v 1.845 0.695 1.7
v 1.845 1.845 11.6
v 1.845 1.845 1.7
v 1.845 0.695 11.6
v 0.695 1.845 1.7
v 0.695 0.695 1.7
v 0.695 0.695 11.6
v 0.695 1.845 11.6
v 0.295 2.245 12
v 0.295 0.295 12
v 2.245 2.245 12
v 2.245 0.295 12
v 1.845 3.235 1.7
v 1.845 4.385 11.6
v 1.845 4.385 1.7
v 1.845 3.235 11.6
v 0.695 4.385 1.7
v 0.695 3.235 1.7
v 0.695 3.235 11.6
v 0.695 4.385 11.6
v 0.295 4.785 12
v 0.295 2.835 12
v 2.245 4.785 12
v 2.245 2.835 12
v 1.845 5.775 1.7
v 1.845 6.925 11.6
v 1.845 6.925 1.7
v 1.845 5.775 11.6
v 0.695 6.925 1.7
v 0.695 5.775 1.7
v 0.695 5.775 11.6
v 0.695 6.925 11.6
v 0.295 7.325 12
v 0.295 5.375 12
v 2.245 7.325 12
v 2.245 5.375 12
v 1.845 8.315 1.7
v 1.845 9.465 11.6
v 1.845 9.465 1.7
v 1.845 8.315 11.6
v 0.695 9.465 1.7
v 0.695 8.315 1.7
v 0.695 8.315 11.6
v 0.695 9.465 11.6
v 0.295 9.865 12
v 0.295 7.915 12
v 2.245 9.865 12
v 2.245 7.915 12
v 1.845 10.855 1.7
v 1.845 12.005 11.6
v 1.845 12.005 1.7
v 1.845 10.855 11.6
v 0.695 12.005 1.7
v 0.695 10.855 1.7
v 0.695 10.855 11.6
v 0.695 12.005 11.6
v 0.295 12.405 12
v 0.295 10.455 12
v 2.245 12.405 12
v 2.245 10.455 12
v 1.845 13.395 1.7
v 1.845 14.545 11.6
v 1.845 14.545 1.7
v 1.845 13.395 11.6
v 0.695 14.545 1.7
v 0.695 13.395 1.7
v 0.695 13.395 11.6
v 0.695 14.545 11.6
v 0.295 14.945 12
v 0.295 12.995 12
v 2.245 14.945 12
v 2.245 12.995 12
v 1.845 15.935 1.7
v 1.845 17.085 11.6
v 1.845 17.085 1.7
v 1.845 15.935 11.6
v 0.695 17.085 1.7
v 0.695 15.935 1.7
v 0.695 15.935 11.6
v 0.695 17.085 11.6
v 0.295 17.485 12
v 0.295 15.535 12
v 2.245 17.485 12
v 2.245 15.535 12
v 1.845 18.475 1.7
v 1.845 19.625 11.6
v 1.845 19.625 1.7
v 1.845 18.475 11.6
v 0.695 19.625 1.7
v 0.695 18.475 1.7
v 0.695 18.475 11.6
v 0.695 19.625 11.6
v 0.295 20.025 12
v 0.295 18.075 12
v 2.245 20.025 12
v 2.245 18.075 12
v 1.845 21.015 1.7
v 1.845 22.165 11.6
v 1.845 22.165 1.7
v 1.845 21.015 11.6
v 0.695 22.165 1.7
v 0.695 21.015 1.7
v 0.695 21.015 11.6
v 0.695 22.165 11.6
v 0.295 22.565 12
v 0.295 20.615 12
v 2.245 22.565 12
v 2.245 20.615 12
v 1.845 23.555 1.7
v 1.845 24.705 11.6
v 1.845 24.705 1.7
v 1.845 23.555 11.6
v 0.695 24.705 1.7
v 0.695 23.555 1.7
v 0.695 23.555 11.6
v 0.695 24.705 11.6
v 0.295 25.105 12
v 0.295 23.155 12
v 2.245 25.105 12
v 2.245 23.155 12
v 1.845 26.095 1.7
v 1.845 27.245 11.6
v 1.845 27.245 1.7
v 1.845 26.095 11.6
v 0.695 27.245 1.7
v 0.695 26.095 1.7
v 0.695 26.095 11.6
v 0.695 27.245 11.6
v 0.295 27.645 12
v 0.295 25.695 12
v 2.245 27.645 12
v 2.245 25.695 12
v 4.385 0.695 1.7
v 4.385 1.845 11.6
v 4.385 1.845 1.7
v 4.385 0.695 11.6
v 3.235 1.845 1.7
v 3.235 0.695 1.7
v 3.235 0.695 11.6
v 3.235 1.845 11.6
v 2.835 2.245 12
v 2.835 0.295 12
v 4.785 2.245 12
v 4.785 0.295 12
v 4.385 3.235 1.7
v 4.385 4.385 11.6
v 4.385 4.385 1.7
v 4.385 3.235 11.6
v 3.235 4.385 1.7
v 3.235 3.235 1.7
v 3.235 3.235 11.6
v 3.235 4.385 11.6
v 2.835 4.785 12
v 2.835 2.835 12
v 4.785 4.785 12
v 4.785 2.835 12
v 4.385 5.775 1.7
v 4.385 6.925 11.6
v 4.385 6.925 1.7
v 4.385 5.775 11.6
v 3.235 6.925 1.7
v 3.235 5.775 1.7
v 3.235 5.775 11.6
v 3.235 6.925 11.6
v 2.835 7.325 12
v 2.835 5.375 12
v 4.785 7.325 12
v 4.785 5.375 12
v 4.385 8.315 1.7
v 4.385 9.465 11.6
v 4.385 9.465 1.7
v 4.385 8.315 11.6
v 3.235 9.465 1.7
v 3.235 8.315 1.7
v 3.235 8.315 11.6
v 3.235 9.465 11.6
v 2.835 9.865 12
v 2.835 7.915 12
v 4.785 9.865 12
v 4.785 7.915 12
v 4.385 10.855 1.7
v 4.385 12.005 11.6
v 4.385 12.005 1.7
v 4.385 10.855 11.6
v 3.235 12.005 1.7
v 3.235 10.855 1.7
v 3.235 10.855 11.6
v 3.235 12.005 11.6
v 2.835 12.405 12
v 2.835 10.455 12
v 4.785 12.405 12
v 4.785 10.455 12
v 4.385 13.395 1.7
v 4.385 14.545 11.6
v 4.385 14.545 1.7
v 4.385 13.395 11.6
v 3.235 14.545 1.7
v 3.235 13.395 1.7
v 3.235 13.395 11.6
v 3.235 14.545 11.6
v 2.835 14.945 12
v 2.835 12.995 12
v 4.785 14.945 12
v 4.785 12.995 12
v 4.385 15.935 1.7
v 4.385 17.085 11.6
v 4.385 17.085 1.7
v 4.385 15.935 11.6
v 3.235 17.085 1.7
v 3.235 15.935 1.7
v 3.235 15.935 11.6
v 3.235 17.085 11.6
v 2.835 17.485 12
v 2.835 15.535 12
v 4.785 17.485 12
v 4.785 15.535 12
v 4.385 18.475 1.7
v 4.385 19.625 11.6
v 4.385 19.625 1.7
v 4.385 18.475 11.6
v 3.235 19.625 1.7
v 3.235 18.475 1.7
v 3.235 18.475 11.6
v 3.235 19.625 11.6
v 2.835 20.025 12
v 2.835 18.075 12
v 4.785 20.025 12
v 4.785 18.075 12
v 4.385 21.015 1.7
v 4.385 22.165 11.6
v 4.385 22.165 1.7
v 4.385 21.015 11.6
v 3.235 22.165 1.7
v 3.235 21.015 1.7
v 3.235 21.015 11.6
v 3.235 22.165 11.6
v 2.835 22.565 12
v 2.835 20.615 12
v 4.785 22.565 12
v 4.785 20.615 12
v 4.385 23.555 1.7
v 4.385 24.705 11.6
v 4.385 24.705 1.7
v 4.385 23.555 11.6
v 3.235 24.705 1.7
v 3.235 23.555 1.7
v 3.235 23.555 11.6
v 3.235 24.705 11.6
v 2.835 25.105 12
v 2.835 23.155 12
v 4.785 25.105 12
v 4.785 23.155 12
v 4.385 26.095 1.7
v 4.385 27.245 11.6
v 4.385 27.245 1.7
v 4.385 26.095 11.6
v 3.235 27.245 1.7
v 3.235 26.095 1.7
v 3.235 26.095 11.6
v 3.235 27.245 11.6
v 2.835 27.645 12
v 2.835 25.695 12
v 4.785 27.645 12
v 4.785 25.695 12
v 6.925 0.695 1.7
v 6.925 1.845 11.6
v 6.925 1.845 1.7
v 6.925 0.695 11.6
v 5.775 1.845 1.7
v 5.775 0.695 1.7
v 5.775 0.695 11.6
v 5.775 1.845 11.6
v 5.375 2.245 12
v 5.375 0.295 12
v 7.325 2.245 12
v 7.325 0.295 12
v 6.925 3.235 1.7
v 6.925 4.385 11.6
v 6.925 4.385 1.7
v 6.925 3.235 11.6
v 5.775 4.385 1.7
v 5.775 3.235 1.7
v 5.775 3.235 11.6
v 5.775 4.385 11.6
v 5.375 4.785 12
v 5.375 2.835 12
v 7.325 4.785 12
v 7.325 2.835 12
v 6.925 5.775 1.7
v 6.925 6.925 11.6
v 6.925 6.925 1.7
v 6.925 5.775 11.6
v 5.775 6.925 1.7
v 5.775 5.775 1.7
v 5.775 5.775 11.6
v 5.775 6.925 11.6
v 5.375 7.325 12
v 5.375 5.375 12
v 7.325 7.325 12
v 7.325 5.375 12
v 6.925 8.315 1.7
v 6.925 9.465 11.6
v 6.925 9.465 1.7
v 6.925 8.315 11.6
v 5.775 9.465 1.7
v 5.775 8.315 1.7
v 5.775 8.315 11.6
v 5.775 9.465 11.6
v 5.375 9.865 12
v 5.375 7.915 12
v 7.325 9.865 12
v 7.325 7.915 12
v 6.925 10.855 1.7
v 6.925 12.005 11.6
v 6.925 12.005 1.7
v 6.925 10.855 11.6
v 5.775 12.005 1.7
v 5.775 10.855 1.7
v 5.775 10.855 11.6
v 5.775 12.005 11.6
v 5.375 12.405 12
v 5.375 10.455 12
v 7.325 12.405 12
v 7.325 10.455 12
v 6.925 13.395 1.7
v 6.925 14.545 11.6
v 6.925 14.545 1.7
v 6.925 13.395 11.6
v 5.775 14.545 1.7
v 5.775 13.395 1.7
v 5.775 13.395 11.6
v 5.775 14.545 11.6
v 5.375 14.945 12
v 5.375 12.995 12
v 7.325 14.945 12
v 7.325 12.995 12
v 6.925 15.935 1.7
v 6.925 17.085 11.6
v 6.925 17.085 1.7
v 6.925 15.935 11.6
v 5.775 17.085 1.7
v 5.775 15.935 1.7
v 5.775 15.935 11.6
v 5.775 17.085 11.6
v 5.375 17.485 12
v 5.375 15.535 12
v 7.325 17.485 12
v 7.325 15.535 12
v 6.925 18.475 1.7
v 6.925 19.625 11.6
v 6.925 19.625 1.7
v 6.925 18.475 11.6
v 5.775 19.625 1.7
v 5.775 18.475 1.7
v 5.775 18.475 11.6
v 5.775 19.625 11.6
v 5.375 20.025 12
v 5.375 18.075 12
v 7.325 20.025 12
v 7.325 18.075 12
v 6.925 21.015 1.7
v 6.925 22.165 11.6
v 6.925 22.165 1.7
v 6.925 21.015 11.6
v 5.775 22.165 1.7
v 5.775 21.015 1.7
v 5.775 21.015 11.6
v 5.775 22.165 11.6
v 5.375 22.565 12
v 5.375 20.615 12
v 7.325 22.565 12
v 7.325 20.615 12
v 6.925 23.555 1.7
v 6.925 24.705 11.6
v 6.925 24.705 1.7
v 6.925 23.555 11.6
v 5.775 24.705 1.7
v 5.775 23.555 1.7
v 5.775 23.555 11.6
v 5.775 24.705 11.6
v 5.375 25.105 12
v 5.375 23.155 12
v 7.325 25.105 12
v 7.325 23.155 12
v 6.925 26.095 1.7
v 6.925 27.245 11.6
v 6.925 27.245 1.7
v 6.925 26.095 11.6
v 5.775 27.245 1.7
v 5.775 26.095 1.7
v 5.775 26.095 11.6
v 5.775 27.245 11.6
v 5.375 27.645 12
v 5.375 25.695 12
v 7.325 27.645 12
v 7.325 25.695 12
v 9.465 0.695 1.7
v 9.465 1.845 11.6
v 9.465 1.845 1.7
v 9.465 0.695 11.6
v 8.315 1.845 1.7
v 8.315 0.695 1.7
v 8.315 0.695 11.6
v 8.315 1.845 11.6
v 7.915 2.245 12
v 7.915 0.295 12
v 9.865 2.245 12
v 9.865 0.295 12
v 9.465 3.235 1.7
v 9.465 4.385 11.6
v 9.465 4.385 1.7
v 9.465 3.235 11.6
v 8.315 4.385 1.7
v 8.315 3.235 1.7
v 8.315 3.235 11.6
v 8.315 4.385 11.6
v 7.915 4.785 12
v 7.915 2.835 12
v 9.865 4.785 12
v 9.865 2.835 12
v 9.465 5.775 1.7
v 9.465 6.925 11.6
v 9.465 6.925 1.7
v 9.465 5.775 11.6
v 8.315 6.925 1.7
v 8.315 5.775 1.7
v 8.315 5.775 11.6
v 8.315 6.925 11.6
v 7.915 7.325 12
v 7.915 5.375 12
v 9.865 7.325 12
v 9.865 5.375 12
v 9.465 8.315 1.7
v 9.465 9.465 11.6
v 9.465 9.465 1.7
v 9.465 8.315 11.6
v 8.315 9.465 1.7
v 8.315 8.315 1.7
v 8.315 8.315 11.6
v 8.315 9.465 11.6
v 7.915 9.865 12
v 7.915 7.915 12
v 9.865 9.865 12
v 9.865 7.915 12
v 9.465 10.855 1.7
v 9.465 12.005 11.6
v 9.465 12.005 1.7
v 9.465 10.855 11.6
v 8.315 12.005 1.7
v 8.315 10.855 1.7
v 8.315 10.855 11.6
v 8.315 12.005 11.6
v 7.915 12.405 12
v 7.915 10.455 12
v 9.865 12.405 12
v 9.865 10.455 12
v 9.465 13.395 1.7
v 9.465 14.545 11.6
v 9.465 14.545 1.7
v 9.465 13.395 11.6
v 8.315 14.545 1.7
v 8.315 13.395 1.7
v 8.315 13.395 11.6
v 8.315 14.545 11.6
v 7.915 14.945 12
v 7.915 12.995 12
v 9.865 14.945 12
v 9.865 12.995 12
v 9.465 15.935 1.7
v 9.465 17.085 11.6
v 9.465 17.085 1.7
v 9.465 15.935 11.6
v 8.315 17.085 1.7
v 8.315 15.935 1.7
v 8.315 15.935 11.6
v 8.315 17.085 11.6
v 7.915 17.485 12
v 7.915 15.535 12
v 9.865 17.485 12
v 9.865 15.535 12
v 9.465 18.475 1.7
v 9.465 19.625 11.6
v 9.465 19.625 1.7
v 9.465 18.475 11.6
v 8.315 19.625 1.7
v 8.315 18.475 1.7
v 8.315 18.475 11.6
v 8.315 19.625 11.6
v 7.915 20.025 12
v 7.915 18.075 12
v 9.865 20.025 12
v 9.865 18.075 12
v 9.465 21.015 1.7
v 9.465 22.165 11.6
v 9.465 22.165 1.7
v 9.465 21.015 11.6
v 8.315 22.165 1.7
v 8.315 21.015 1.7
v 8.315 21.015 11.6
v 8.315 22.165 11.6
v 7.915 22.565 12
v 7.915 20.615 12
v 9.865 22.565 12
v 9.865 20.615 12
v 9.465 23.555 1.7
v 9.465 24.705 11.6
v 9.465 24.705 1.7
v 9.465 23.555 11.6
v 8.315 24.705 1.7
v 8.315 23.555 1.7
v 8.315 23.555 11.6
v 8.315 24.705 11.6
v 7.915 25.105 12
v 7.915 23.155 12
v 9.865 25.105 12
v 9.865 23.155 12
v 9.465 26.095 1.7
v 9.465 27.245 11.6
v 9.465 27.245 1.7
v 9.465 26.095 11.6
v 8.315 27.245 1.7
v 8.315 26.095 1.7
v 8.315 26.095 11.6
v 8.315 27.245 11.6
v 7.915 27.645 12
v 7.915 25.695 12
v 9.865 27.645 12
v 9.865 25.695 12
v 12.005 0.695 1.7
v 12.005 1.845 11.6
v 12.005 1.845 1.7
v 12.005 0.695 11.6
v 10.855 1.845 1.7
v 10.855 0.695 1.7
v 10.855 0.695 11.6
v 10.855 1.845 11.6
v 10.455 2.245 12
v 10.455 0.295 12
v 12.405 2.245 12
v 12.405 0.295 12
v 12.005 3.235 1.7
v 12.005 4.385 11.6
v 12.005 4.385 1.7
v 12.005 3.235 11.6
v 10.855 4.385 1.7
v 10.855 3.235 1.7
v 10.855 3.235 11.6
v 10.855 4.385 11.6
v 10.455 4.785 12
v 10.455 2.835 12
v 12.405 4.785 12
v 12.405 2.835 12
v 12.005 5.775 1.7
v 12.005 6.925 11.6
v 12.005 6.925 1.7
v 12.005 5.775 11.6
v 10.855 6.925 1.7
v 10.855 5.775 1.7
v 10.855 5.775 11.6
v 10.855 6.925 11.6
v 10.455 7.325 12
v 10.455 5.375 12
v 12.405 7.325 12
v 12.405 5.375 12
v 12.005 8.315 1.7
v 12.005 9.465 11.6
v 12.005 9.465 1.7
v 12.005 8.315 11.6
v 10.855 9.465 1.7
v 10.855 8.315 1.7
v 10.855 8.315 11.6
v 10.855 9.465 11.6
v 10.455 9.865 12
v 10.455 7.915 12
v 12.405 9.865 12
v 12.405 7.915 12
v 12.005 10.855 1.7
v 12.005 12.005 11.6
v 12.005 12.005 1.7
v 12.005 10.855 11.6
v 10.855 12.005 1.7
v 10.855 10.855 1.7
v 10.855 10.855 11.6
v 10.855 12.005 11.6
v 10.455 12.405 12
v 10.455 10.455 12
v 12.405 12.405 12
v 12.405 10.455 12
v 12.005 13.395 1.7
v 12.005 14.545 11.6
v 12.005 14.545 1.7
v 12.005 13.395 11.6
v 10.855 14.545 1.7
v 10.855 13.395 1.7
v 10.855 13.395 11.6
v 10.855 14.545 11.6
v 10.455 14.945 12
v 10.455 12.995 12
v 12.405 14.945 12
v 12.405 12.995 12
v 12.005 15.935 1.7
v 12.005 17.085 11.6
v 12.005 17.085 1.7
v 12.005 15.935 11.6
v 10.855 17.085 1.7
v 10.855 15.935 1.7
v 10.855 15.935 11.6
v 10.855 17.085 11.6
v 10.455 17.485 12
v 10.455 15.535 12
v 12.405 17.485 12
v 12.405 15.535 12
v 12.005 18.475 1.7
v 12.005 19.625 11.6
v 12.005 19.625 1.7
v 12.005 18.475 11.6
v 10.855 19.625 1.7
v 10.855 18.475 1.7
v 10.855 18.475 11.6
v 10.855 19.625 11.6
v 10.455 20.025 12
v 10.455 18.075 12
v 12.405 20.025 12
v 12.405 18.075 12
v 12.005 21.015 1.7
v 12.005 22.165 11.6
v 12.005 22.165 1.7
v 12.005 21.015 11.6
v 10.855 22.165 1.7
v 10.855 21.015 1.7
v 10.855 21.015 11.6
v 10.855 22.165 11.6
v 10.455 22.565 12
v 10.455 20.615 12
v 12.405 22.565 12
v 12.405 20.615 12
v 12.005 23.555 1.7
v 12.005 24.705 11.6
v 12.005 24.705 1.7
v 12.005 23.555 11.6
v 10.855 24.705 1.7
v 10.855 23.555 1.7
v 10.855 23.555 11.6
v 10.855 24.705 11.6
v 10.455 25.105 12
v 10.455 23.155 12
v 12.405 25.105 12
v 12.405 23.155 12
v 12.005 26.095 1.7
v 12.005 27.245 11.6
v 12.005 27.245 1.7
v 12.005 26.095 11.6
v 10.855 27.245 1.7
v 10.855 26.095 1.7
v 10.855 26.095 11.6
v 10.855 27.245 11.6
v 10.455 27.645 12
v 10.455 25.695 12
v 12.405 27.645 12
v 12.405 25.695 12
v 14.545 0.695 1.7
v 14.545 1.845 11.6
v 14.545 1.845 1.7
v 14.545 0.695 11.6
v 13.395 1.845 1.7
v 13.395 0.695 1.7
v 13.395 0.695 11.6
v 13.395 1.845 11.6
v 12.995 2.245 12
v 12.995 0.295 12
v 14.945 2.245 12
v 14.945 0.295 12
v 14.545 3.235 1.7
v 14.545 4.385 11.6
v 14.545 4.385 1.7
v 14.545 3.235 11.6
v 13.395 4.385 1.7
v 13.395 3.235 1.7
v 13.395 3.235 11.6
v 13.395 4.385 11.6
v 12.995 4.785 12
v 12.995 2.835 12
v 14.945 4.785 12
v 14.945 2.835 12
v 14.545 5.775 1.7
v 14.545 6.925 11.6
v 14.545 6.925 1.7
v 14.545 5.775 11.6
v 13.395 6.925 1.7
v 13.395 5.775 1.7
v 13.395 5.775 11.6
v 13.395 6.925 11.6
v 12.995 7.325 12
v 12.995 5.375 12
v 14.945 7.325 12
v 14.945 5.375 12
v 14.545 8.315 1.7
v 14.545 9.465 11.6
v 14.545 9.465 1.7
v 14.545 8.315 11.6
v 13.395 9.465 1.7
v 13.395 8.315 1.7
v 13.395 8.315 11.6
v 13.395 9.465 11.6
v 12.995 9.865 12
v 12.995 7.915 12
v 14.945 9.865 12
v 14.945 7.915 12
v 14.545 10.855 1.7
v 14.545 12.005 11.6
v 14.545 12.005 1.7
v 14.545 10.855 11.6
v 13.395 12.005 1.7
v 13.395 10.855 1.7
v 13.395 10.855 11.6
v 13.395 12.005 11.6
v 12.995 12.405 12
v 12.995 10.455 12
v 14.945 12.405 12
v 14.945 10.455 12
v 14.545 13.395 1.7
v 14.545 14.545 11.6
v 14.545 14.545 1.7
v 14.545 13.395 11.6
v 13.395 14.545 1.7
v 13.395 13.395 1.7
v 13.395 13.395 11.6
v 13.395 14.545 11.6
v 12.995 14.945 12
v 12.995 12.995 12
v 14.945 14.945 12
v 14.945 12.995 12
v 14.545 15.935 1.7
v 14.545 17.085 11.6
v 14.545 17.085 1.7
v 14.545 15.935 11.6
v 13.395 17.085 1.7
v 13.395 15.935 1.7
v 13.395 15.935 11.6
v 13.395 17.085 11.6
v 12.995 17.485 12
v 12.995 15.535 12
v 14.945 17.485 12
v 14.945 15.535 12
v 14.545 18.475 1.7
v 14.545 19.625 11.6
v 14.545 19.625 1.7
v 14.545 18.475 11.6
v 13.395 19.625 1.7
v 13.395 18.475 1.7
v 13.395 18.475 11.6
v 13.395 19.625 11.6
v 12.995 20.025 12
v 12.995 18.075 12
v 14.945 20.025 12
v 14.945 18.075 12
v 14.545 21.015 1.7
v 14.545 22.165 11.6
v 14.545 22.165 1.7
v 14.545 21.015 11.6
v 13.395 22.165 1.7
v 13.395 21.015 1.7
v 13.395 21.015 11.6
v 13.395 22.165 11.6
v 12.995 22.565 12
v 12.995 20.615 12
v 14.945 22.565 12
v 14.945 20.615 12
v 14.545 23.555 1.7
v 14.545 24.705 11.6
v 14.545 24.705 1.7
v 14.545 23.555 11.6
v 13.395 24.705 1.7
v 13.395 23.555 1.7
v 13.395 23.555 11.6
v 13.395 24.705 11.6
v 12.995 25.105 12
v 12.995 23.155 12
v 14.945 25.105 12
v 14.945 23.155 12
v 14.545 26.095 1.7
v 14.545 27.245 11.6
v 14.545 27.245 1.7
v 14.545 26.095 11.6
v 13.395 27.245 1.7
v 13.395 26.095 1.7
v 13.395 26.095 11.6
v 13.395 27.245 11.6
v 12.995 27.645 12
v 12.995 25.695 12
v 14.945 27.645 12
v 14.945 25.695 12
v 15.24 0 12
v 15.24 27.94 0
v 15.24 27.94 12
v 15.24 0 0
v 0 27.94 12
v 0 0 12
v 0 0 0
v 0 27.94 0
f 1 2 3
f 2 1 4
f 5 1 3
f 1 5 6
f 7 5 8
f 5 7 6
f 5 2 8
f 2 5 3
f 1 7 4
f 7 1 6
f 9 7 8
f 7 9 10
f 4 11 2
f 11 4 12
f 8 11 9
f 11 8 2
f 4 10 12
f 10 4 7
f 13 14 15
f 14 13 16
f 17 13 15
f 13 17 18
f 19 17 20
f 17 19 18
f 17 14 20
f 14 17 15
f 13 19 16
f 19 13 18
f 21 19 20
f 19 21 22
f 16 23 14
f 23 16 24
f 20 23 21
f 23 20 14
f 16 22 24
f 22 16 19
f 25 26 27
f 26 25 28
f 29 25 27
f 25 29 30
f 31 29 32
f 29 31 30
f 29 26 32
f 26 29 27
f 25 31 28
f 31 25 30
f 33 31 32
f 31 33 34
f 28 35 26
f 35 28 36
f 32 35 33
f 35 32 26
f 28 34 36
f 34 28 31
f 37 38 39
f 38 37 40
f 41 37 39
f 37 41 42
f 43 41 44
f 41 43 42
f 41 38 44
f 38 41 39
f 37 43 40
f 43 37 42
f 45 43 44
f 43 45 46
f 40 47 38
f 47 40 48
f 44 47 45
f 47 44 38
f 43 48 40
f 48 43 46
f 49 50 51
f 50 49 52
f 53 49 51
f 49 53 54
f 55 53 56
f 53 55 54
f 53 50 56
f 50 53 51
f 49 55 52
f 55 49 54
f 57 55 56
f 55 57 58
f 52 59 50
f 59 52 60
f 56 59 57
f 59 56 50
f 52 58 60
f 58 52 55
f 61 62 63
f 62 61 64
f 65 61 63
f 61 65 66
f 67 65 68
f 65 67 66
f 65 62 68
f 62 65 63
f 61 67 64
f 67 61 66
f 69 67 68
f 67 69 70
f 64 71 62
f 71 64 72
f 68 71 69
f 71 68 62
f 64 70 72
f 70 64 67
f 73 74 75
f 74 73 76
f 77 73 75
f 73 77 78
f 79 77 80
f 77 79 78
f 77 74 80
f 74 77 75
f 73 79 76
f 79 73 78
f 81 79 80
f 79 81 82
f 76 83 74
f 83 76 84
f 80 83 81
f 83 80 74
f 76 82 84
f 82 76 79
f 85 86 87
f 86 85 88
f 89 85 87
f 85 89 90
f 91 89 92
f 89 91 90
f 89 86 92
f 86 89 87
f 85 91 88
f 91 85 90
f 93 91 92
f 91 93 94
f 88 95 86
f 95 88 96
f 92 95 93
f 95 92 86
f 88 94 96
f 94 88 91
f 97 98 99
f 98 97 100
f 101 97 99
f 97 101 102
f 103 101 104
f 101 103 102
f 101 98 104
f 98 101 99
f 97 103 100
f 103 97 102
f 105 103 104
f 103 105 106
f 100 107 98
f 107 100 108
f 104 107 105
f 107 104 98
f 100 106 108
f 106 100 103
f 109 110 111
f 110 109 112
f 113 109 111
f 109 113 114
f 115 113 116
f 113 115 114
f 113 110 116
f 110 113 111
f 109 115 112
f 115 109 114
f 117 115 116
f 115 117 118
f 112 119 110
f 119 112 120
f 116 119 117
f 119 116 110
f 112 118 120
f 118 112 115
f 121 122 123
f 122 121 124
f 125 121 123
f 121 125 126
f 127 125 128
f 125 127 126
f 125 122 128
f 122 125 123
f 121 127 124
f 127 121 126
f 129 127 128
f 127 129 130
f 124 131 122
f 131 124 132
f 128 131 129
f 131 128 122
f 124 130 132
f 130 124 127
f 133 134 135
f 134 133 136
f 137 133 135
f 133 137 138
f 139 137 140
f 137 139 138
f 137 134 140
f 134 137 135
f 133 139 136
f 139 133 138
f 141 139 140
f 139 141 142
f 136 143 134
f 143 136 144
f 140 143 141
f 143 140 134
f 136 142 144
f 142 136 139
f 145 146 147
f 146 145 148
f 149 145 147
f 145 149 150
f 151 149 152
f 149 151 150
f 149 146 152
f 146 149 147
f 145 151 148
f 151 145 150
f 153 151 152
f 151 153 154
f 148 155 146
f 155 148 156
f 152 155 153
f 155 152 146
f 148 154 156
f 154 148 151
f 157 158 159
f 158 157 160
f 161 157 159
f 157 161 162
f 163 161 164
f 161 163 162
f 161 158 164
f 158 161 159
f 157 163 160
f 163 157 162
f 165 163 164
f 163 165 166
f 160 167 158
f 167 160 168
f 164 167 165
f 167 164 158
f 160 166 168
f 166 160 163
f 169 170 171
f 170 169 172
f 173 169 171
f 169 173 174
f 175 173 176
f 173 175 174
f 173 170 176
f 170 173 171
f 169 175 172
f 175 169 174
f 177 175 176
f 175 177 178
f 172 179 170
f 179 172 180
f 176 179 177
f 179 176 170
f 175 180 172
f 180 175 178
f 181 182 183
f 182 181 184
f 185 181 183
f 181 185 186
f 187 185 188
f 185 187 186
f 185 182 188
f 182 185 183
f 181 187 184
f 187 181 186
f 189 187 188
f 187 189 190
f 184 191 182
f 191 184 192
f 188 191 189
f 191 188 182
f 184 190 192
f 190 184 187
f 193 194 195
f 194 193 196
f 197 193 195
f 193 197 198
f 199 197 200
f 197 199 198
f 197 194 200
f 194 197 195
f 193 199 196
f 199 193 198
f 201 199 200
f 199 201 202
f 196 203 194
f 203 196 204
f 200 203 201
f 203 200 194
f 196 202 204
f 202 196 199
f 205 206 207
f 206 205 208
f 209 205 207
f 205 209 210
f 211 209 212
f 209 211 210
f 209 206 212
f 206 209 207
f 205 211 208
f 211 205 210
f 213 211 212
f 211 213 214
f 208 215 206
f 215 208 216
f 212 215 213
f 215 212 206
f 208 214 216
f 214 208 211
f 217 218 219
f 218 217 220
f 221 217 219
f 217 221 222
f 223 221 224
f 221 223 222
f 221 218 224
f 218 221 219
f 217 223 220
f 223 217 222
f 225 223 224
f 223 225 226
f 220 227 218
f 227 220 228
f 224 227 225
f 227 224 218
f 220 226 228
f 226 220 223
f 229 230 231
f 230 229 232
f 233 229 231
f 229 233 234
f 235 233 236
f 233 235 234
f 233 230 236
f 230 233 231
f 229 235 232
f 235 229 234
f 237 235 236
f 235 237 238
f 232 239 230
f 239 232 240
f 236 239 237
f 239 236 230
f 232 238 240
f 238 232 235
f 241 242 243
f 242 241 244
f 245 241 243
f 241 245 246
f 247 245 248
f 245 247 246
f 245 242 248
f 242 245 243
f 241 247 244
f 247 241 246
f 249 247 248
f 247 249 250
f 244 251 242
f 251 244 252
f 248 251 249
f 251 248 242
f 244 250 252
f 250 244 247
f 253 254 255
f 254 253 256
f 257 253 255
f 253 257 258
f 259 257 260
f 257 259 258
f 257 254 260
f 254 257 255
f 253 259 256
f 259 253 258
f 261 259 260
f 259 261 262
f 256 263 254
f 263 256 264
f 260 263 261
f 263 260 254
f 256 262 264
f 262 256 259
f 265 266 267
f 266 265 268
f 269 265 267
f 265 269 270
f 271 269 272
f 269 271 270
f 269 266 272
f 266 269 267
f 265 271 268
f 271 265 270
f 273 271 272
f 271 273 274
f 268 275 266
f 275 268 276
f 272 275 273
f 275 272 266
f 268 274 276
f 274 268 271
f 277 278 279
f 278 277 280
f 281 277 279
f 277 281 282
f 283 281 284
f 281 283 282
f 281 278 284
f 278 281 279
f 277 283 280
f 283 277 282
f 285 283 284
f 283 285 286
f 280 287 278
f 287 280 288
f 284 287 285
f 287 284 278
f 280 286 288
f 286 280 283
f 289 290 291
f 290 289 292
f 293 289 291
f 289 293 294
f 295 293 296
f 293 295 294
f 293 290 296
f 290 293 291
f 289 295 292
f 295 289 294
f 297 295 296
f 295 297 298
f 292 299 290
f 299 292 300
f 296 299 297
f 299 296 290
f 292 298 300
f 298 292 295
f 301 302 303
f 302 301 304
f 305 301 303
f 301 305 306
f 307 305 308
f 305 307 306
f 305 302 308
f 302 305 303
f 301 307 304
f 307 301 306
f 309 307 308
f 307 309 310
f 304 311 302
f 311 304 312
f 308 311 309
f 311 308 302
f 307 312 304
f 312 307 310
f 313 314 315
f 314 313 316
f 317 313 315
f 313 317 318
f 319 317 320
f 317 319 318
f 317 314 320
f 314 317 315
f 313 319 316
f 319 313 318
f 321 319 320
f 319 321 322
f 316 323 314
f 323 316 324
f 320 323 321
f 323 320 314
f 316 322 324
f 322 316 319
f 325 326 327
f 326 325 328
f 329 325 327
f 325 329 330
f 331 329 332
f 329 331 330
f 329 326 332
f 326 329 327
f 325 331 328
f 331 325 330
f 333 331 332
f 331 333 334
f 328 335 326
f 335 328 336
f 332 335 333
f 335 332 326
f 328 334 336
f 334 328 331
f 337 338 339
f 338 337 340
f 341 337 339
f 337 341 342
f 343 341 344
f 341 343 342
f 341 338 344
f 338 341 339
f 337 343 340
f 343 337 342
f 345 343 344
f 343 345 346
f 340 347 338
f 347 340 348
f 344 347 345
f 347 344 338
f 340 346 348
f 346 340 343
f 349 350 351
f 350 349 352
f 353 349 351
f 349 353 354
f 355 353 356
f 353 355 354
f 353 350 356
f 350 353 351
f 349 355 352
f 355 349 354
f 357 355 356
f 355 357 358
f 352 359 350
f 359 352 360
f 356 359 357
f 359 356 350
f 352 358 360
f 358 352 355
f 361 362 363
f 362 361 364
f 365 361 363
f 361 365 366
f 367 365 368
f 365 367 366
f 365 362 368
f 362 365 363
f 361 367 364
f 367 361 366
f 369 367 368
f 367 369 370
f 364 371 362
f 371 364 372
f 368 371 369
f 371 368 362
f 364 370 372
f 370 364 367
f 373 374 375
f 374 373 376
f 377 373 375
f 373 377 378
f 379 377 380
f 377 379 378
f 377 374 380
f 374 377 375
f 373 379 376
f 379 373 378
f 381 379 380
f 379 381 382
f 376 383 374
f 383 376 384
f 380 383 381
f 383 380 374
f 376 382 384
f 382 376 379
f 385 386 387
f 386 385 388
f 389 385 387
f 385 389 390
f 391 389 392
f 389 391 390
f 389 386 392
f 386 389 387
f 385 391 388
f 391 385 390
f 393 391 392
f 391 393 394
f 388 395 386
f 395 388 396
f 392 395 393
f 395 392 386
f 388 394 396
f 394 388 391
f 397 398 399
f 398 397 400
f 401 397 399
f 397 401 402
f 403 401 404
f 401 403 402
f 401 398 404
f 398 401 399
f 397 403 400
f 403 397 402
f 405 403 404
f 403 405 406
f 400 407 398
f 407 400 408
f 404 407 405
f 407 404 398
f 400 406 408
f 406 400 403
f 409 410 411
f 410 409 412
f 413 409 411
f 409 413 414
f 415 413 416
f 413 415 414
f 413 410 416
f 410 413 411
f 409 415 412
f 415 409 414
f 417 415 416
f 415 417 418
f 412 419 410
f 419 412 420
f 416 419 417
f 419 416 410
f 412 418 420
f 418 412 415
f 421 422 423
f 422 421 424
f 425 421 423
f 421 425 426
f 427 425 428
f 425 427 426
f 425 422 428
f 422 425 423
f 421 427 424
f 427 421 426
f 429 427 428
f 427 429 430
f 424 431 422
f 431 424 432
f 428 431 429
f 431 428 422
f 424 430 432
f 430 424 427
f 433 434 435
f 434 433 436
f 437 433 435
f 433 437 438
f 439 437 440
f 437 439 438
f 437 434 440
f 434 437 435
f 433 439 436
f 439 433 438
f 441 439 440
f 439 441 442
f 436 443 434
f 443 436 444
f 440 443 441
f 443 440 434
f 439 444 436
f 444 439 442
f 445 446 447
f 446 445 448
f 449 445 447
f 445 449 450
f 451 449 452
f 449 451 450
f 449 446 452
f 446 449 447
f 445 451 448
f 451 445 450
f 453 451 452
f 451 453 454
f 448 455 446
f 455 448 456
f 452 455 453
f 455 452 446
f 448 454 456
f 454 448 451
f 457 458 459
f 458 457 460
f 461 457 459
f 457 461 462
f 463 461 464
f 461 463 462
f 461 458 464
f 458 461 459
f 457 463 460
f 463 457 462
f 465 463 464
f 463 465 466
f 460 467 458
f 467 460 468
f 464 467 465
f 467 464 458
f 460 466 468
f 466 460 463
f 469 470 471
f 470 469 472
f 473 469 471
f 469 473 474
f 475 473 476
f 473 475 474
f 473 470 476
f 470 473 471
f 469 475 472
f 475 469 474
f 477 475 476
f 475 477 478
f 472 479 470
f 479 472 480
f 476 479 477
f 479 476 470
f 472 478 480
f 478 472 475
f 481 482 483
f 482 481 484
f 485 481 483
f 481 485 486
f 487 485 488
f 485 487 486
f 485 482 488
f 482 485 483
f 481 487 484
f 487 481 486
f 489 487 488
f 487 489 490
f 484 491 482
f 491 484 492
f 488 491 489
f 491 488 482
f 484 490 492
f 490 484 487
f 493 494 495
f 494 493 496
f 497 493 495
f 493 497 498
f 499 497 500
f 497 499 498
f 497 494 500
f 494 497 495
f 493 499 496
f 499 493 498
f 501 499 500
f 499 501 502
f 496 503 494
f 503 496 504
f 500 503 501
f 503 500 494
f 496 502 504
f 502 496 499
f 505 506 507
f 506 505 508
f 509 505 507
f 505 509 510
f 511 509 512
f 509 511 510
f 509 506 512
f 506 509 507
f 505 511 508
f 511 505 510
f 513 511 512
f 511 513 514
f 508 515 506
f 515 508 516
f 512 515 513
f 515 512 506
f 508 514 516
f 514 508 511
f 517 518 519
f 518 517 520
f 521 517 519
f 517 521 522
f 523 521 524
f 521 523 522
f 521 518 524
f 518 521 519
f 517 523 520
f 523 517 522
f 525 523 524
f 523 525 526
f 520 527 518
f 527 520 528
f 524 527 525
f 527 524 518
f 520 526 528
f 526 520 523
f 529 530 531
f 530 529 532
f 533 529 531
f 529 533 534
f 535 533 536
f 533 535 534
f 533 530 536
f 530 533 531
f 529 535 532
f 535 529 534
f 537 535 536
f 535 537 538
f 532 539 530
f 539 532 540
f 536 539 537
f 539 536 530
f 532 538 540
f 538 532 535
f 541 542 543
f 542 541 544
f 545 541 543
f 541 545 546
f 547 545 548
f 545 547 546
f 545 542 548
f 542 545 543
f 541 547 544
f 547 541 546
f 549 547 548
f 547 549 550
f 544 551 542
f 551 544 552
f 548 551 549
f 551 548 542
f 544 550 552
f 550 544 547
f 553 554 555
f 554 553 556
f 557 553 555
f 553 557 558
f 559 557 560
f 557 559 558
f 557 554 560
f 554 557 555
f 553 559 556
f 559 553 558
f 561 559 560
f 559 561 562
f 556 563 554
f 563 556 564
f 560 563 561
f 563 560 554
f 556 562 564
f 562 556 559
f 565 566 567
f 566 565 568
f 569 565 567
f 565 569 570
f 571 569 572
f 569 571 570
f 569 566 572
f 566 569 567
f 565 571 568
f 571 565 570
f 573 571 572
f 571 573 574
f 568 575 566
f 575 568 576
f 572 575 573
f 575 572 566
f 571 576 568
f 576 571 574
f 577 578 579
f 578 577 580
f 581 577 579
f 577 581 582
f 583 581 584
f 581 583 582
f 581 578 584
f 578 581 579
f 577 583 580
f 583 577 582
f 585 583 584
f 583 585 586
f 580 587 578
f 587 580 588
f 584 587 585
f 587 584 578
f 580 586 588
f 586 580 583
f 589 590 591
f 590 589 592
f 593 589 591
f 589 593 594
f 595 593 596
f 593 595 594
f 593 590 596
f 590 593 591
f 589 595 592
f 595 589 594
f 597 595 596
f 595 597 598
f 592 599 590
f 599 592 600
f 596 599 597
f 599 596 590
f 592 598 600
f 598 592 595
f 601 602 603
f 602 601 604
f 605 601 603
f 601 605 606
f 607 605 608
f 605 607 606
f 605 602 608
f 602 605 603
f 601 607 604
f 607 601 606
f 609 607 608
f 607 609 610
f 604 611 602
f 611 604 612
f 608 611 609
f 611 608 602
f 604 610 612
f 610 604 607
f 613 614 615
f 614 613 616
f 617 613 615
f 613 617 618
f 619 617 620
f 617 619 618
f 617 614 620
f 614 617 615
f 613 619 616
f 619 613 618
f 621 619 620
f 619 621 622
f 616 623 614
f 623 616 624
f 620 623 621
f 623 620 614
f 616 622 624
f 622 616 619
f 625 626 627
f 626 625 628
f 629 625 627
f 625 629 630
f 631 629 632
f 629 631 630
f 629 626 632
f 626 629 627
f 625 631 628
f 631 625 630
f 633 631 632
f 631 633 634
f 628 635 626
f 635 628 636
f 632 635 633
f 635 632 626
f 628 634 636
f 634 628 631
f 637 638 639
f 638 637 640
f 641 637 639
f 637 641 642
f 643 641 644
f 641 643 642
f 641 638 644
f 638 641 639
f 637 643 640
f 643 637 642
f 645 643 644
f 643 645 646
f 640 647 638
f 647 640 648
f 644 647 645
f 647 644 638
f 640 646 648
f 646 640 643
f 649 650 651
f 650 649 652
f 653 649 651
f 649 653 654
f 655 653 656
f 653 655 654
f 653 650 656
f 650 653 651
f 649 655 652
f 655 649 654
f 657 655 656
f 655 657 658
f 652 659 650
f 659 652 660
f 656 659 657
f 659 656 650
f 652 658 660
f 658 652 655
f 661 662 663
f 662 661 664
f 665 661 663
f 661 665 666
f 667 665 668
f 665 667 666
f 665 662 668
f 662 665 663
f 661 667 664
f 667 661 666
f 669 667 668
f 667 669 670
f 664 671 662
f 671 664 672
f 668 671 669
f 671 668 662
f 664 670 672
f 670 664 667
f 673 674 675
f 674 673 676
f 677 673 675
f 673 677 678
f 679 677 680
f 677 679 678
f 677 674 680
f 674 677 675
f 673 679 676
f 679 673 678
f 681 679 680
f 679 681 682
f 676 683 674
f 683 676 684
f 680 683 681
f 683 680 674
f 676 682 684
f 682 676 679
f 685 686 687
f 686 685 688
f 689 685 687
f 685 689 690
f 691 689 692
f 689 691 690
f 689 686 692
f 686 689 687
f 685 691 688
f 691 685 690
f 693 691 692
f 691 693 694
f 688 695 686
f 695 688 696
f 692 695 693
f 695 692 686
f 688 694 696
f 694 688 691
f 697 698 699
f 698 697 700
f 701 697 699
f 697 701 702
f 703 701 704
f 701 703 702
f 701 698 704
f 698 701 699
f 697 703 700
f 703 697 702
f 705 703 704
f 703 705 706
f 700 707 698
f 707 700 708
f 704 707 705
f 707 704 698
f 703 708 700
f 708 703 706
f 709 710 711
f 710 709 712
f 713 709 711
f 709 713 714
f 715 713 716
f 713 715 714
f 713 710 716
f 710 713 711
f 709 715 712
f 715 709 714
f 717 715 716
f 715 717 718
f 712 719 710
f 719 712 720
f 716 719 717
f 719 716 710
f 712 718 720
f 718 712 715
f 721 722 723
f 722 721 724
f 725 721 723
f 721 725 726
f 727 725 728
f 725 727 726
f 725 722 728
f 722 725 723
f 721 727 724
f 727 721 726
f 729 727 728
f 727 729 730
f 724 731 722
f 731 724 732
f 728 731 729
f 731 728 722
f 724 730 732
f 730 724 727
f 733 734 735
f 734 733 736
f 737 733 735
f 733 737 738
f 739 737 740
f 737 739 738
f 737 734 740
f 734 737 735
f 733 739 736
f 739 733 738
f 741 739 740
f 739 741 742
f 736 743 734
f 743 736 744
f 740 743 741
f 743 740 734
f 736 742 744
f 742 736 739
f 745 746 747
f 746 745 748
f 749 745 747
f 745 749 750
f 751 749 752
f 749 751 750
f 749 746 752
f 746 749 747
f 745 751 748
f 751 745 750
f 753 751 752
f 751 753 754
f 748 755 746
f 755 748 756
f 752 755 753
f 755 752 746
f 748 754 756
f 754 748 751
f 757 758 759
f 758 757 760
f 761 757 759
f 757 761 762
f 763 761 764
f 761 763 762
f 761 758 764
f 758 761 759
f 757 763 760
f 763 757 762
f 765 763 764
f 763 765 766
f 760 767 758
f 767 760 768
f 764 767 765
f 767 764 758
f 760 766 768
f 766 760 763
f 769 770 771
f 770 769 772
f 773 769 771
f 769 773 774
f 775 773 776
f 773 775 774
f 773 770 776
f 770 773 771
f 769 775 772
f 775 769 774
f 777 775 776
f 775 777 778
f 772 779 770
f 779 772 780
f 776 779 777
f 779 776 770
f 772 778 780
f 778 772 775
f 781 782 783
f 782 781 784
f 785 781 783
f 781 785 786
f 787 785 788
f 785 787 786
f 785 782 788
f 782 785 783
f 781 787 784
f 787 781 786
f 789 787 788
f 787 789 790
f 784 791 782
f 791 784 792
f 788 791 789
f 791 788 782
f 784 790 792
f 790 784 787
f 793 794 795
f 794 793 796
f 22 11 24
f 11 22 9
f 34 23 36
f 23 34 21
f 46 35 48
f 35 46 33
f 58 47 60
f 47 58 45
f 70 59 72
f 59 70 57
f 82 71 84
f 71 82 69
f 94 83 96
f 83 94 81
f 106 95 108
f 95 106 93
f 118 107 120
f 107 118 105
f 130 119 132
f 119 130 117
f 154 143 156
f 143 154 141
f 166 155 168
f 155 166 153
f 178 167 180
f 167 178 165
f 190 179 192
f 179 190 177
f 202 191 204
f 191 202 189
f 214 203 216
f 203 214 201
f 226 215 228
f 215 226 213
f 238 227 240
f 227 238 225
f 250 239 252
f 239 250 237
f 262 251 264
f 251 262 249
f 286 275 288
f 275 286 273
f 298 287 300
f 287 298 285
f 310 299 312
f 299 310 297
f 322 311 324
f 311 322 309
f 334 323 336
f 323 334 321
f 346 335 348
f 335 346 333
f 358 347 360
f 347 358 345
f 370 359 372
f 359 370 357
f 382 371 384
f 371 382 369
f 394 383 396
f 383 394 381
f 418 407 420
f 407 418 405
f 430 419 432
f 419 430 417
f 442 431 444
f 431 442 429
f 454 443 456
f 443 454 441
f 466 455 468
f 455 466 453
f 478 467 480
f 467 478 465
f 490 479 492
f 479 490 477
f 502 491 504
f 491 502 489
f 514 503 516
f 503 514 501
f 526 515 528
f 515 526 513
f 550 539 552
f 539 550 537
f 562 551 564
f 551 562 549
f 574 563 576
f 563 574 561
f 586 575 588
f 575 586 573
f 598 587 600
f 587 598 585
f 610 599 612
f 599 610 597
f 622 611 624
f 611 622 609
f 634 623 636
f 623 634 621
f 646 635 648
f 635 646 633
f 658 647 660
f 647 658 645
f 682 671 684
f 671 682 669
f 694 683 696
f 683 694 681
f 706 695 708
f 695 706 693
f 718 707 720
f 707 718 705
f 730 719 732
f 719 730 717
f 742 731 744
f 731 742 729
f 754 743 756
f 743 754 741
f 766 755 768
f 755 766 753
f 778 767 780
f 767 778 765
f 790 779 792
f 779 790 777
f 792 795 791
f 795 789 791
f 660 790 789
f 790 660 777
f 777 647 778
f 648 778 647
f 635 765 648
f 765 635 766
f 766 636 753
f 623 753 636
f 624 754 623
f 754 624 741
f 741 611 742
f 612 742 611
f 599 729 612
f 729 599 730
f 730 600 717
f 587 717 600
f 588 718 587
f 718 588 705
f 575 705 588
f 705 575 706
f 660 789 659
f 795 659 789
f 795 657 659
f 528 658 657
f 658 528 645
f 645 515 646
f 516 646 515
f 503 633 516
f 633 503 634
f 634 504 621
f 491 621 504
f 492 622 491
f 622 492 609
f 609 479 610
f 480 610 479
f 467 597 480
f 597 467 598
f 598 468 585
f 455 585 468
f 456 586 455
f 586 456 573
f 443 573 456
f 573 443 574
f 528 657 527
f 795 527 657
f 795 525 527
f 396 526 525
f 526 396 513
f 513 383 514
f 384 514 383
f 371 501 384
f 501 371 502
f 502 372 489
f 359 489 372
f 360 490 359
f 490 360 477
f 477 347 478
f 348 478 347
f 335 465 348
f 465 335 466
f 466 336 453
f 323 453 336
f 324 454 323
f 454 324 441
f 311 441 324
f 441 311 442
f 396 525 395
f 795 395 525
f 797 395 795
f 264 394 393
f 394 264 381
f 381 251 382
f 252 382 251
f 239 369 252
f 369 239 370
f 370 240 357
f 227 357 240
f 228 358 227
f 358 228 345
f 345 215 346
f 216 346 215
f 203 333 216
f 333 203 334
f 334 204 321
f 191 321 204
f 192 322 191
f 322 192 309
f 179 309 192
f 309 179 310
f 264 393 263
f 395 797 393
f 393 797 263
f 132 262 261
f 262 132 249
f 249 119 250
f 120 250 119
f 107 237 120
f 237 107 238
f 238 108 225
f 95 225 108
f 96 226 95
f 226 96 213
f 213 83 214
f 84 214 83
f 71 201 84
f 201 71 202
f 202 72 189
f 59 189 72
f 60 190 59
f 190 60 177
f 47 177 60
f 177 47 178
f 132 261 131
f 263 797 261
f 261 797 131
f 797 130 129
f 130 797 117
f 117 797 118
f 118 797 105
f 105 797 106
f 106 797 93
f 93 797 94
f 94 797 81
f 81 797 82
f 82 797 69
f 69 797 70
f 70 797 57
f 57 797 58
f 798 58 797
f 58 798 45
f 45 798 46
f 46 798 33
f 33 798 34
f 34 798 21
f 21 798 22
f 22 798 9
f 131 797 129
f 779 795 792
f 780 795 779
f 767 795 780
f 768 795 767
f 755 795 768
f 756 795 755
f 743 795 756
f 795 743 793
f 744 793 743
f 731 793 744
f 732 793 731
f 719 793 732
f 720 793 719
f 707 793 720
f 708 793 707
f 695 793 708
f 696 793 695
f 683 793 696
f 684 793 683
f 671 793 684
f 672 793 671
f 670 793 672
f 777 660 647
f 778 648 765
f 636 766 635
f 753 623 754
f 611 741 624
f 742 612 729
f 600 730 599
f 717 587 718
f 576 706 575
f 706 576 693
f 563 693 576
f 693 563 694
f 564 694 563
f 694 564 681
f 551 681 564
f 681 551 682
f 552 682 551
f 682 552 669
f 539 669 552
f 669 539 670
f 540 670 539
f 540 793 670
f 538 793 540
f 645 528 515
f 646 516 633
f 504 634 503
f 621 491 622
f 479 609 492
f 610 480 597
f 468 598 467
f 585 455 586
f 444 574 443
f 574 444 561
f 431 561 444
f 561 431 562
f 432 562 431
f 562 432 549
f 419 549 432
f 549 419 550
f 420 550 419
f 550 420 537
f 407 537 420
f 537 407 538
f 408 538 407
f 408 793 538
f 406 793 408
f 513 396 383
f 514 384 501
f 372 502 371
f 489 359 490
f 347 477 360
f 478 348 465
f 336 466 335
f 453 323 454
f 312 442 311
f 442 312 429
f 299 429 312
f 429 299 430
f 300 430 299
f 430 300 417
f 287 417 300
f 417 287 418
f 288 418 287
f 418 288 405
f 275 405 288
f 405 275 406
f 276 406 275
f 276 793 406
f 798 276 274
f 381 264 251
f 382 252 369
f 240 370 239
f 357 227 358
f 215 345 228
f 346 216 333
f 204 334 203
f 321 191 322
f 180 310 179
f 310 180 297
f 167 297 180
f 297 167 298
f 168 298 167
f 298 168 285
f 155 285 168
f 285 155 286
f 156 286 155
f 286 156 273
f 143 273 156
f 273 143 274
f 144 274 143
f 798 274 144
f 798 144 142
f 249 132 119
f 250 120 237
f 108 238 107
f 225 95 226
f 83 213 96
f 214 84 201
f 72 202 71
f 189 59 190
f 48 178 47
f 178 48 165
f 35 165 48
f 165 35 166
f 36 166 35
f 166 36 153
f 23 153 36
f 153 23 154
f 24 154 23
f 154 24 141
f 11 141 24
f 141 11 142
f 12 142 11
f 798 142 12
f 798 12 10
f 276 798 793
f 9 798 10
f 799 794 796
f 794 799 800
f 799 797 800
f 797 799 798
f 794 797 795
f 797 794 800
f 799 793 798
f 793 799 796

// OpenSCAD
/* Simple Module Power board */
$fn=50;
fudge=0.1;

*PDModule();

breadBoard();

module breadBoard(size=[5,10], h=12,brim=1.27,spacing=0.2){
  pitch=2.54;
  difference(){
    cube([size.x*pitch+brim*2,size.y*pitch+brim*2,h]);
    translate([brim,brim,h]) breadBoardPins(spacing=spacing);
  }
}
  
  
module breadBoardPins(count=[19,10], h=10, spacing=0.2){
  pinDims=[0.75,0.75];
  pinSpcng=spacing;
  pinLen=h;
  chamfer=0.4;
  pitch=2.54;
  
  for (ix=[0:count.x],iy=[0:count.y])
    translate([ix*pitch,iy*pitch,0]) pinHole();
    
  module pinHole(){
    topWdth=pinDims.x+chamfer*2+pinSpcng*2;
    botWdth=pinDims.x+pinSpcng*2;
    sFact=topWdth/botWdth;
    
    translate([0,0,fudge/2]) cube([ topWdth,topWdth,fudge],true);
    translate([0,0,-pinLen/2-pinSpcng]) cube([botWdth,botWdth,pinLen+pinSpcng],true);
    translate([0,0,-chamfer]) linear_extrude(chamfer, scale=sFact) square(botWdth,true);
    
  }
}

module PDModule(){
  /* "PD decoy module, 5A", "HW-398"
  i.e. https://de.aliexpress.com/item/1005008233128518.html
  see also: https://pappp.net/?p=73103
  set to 5V by not selecting any of the options (all open)
  */
  brdDims=[11.75,23.4,1];
  cntcDims=[1.75,3];
  
  color(pcbBlackCol) translate([0,brdDims.y/2,brdDims.z/2]) cube(brdDims,true);
  translate([0,4.5+0.6,brdDims.z]) usbC();
  color(metalGreyPinCol) for (ix=[-1,1])
    translate([ix*(brdDims.x-cntcDims.x)/2,brdDims.y-cntcDims.y/2,brdDims.z]) cube([cntcDims.x,cntcDims.y,0.1],true);
}


*usbC(plug=false);
module usbC(center=false, pins=24, plug=false){
  //https://usb.org/document-library/usb-type-cr-cable-and-connector-specification-revision-21
  //rev 2.1 may 2021
  //receptacle dims
  shellOpng=[8.34,2.56];
  shellLngth=4.5; //reference Length of shell to datum A
  shellThck=0.2;
  centerOffset = center ? [0,0,-(shellOpng.y+shellThck*2)/2] : [0,0,0] ;
  //tongue
  tngDims=[6.69,4.45,0.6];

  //body
  bdyLngth=3;

  //contacts
  //          pinA1          ...                        pinA12
  cntcLngths= (pins>16) ? [4,3.5,3.5,4,3.5,3.5,3.5,3.5,4,3.5,3.5,4] : //8x short, 4x long per side
                          [4,0,0,4,3.5,3.5,3.5,3.5,4,0,0,4]; //16pin
  cntcDims=[0.25,0.05]; //width, thickness
  
  pitch=0.5;
  
  //assembly
  translate([0,0,shellOpng.y/2+shellThck]+centerOffset) rotate([90,0,0]){
    //shell
    color(metalSilverCol) translate([0,0,-bdyLngth]) rcptShell(shellLngth+bdyLngth);
    tongue();
    color(blackBodyCol) translate([0,0,-bdyLngth]) linear_extrude(bdyLngth) shellShape();
  }

  //plug
  if (plug)
    translate([0,0,shellOpng.y/2+shellThck]+centerOffset) rotate([-90,0,0]) plug();
  
  module tongue(){
    tngPoly=[[0,0.6],[1.37,0.6],[1.62,tngDims.z/2],[tngDims.y-0.1,tngDims.z/2],[tngDims.y,tngDims.z/2-0.1],
    [tngDims.y,-(tngDims.z/2-0.1)],[tngDims.y-0.1,-tngDims.z/2],[1.62,-tngDims.z/2],[1.37,-0.6],[0,-0.6]];

    color(blackBodyCol) rotate([0,-90,0]) linear_extrude(tngDims.x,center=true) polygon(tngPoly);
    for (ix=[0:11],iy=[-1,1])
      color(metalGoldPinCol) translate([ix*pitch-11/2*pitch,iy*(tngDims.z+cntcDims.y)/2,cntcLngths[ix]/2]) 
        cube([cntcDims.x,cntcDims.y,cntcLngths[ix]],true);
  }

  module rcptShell(length=shellLngth){
    linear_extrude(length) difference(){
      offset(shellThck) shellShape();
      shellShape();
    }
  }
  module shellShape(size=[shellOpng.x,shellOpng.y]){
    hull() for (ix=[-1,1])
        translate([ix*(size.x-size.y)/2,0]) circle(d=size.y);
  }
  
  module plug(){
    //minimal Plug length from USB.org
    translate([0,0,-6.65]){
      color(metalGreyPinCol) linear_extrude(6.65)
        shellShape(size=[8.25,2.4]);
      //body max width,height
      color(blackBodyCol) translate([0,0,-35]) 
        linear_extrude(35) shellShape(size=[12.35,6.5]);
    }
  }
}


//KiCAD Colors
ledAlpha=0.1;
glassAlpha=0.39;

metalGreyPinCol=    [0.824, 0.820,  0.781];
metalGreyCol=       [0.298, 0.298,  0.298]; //metal Grey
metalCopperCol=     [0.7038,0.27048,0.0828]; //metal Copper
metalAluminiumCol=  [0.372322, 0.371574, 0.373173];
metalBronzeCol=     [0.714, 0.4284, 0.18144];
metalSilverCol=     [0.50754, 0.50754, 0.50754];
resblackBodyCol=    [0.082, 0.086,  0.094]; //resistor black body
darkGreyBodyCol=    [0.273, 0.273,  0.273]; //dark grey body
brownBodyCol=       [0.379, 0.270,  0.215]; //brown Body
lightBrownBodyCol=  [0.883, 0.711,  0.492]; //light brown body
pinkBodyCol=        [0.578, 0.336,  0.352]; //pink body
blueBodyCol=        [0.137, 0.402,  0.727]; //blue body
greenBodyCol=       [0.340, 0.680,  0.445]; //green body
orangeBodyCol=      [0.809, 0.426,  0.148]; //orange body
redBodyCol=         [0.700, 0.100,  0.050]; 
yellowBodyCol=      [0.832, 0.680,  0.066];
whiteBodyCol=       [0.895, 0.891,  0.813];
metalGoldPinCol=    [0.859, 0.738,  0.496];
blackBodyCol=       [0.148, 0.145,  0.145];
greyBodyCol=        [0.250, 0.262,  0.281];
lightBrownLabelCol= [0.691, 0.664,  0.598];
ledBlueCol=         [0.700, 0.100,  0.050, ledAlpha];
ledYellowCol=       [0.100, 0.250,  0.700, ledAlpha];
ledGreyCol=         [0.98,  0.840,  0.066, ledAlpha];
ledRedCol=          [0.700, 0.100,  0.050, ledAlpha];
ledWhiteCol=        [0.895, 0.891,  0.813, ledAlpha];
ledgreyCol=         [0.27, 0.25, 0.27, ledAlpha];
ledBlackCol=        [0.1, 0.05, 0.1];
ledGreenCol=        [0.400, 0.700,  0.150, ledAlpha];
glassGreyCol=       [0.400769, 0.441922, 0.459091, glassAlpha];
glassGoldCol=       [0.566681, 0.580872, 0.580874, glassAlpha];
glassBlueCol=       [0.000000, 0.631244, 0.748016, glassAlpha];
glassGreenCol=      [0.000000, 0.75, 0.44, glassAlpha];
glassOrangeCol=     [0.75, 0.44, 0.000000, glassAlpha];
pcbGreenCol=        [0.07,  0.3,    0.12]; //pcb green
pcbBlackCol=        [0.16,  0.16,   0.16]; //pcb black
pcbBlueCol=            [0.07,  0.12,   0.3];
FR4darkCol=         [0.2,   0.17,   0.087]; //?
FR4Col=             [0.43,  0.46,   0.295]; //?
//non VRML cols
polymidCol=         "#cd8200";
